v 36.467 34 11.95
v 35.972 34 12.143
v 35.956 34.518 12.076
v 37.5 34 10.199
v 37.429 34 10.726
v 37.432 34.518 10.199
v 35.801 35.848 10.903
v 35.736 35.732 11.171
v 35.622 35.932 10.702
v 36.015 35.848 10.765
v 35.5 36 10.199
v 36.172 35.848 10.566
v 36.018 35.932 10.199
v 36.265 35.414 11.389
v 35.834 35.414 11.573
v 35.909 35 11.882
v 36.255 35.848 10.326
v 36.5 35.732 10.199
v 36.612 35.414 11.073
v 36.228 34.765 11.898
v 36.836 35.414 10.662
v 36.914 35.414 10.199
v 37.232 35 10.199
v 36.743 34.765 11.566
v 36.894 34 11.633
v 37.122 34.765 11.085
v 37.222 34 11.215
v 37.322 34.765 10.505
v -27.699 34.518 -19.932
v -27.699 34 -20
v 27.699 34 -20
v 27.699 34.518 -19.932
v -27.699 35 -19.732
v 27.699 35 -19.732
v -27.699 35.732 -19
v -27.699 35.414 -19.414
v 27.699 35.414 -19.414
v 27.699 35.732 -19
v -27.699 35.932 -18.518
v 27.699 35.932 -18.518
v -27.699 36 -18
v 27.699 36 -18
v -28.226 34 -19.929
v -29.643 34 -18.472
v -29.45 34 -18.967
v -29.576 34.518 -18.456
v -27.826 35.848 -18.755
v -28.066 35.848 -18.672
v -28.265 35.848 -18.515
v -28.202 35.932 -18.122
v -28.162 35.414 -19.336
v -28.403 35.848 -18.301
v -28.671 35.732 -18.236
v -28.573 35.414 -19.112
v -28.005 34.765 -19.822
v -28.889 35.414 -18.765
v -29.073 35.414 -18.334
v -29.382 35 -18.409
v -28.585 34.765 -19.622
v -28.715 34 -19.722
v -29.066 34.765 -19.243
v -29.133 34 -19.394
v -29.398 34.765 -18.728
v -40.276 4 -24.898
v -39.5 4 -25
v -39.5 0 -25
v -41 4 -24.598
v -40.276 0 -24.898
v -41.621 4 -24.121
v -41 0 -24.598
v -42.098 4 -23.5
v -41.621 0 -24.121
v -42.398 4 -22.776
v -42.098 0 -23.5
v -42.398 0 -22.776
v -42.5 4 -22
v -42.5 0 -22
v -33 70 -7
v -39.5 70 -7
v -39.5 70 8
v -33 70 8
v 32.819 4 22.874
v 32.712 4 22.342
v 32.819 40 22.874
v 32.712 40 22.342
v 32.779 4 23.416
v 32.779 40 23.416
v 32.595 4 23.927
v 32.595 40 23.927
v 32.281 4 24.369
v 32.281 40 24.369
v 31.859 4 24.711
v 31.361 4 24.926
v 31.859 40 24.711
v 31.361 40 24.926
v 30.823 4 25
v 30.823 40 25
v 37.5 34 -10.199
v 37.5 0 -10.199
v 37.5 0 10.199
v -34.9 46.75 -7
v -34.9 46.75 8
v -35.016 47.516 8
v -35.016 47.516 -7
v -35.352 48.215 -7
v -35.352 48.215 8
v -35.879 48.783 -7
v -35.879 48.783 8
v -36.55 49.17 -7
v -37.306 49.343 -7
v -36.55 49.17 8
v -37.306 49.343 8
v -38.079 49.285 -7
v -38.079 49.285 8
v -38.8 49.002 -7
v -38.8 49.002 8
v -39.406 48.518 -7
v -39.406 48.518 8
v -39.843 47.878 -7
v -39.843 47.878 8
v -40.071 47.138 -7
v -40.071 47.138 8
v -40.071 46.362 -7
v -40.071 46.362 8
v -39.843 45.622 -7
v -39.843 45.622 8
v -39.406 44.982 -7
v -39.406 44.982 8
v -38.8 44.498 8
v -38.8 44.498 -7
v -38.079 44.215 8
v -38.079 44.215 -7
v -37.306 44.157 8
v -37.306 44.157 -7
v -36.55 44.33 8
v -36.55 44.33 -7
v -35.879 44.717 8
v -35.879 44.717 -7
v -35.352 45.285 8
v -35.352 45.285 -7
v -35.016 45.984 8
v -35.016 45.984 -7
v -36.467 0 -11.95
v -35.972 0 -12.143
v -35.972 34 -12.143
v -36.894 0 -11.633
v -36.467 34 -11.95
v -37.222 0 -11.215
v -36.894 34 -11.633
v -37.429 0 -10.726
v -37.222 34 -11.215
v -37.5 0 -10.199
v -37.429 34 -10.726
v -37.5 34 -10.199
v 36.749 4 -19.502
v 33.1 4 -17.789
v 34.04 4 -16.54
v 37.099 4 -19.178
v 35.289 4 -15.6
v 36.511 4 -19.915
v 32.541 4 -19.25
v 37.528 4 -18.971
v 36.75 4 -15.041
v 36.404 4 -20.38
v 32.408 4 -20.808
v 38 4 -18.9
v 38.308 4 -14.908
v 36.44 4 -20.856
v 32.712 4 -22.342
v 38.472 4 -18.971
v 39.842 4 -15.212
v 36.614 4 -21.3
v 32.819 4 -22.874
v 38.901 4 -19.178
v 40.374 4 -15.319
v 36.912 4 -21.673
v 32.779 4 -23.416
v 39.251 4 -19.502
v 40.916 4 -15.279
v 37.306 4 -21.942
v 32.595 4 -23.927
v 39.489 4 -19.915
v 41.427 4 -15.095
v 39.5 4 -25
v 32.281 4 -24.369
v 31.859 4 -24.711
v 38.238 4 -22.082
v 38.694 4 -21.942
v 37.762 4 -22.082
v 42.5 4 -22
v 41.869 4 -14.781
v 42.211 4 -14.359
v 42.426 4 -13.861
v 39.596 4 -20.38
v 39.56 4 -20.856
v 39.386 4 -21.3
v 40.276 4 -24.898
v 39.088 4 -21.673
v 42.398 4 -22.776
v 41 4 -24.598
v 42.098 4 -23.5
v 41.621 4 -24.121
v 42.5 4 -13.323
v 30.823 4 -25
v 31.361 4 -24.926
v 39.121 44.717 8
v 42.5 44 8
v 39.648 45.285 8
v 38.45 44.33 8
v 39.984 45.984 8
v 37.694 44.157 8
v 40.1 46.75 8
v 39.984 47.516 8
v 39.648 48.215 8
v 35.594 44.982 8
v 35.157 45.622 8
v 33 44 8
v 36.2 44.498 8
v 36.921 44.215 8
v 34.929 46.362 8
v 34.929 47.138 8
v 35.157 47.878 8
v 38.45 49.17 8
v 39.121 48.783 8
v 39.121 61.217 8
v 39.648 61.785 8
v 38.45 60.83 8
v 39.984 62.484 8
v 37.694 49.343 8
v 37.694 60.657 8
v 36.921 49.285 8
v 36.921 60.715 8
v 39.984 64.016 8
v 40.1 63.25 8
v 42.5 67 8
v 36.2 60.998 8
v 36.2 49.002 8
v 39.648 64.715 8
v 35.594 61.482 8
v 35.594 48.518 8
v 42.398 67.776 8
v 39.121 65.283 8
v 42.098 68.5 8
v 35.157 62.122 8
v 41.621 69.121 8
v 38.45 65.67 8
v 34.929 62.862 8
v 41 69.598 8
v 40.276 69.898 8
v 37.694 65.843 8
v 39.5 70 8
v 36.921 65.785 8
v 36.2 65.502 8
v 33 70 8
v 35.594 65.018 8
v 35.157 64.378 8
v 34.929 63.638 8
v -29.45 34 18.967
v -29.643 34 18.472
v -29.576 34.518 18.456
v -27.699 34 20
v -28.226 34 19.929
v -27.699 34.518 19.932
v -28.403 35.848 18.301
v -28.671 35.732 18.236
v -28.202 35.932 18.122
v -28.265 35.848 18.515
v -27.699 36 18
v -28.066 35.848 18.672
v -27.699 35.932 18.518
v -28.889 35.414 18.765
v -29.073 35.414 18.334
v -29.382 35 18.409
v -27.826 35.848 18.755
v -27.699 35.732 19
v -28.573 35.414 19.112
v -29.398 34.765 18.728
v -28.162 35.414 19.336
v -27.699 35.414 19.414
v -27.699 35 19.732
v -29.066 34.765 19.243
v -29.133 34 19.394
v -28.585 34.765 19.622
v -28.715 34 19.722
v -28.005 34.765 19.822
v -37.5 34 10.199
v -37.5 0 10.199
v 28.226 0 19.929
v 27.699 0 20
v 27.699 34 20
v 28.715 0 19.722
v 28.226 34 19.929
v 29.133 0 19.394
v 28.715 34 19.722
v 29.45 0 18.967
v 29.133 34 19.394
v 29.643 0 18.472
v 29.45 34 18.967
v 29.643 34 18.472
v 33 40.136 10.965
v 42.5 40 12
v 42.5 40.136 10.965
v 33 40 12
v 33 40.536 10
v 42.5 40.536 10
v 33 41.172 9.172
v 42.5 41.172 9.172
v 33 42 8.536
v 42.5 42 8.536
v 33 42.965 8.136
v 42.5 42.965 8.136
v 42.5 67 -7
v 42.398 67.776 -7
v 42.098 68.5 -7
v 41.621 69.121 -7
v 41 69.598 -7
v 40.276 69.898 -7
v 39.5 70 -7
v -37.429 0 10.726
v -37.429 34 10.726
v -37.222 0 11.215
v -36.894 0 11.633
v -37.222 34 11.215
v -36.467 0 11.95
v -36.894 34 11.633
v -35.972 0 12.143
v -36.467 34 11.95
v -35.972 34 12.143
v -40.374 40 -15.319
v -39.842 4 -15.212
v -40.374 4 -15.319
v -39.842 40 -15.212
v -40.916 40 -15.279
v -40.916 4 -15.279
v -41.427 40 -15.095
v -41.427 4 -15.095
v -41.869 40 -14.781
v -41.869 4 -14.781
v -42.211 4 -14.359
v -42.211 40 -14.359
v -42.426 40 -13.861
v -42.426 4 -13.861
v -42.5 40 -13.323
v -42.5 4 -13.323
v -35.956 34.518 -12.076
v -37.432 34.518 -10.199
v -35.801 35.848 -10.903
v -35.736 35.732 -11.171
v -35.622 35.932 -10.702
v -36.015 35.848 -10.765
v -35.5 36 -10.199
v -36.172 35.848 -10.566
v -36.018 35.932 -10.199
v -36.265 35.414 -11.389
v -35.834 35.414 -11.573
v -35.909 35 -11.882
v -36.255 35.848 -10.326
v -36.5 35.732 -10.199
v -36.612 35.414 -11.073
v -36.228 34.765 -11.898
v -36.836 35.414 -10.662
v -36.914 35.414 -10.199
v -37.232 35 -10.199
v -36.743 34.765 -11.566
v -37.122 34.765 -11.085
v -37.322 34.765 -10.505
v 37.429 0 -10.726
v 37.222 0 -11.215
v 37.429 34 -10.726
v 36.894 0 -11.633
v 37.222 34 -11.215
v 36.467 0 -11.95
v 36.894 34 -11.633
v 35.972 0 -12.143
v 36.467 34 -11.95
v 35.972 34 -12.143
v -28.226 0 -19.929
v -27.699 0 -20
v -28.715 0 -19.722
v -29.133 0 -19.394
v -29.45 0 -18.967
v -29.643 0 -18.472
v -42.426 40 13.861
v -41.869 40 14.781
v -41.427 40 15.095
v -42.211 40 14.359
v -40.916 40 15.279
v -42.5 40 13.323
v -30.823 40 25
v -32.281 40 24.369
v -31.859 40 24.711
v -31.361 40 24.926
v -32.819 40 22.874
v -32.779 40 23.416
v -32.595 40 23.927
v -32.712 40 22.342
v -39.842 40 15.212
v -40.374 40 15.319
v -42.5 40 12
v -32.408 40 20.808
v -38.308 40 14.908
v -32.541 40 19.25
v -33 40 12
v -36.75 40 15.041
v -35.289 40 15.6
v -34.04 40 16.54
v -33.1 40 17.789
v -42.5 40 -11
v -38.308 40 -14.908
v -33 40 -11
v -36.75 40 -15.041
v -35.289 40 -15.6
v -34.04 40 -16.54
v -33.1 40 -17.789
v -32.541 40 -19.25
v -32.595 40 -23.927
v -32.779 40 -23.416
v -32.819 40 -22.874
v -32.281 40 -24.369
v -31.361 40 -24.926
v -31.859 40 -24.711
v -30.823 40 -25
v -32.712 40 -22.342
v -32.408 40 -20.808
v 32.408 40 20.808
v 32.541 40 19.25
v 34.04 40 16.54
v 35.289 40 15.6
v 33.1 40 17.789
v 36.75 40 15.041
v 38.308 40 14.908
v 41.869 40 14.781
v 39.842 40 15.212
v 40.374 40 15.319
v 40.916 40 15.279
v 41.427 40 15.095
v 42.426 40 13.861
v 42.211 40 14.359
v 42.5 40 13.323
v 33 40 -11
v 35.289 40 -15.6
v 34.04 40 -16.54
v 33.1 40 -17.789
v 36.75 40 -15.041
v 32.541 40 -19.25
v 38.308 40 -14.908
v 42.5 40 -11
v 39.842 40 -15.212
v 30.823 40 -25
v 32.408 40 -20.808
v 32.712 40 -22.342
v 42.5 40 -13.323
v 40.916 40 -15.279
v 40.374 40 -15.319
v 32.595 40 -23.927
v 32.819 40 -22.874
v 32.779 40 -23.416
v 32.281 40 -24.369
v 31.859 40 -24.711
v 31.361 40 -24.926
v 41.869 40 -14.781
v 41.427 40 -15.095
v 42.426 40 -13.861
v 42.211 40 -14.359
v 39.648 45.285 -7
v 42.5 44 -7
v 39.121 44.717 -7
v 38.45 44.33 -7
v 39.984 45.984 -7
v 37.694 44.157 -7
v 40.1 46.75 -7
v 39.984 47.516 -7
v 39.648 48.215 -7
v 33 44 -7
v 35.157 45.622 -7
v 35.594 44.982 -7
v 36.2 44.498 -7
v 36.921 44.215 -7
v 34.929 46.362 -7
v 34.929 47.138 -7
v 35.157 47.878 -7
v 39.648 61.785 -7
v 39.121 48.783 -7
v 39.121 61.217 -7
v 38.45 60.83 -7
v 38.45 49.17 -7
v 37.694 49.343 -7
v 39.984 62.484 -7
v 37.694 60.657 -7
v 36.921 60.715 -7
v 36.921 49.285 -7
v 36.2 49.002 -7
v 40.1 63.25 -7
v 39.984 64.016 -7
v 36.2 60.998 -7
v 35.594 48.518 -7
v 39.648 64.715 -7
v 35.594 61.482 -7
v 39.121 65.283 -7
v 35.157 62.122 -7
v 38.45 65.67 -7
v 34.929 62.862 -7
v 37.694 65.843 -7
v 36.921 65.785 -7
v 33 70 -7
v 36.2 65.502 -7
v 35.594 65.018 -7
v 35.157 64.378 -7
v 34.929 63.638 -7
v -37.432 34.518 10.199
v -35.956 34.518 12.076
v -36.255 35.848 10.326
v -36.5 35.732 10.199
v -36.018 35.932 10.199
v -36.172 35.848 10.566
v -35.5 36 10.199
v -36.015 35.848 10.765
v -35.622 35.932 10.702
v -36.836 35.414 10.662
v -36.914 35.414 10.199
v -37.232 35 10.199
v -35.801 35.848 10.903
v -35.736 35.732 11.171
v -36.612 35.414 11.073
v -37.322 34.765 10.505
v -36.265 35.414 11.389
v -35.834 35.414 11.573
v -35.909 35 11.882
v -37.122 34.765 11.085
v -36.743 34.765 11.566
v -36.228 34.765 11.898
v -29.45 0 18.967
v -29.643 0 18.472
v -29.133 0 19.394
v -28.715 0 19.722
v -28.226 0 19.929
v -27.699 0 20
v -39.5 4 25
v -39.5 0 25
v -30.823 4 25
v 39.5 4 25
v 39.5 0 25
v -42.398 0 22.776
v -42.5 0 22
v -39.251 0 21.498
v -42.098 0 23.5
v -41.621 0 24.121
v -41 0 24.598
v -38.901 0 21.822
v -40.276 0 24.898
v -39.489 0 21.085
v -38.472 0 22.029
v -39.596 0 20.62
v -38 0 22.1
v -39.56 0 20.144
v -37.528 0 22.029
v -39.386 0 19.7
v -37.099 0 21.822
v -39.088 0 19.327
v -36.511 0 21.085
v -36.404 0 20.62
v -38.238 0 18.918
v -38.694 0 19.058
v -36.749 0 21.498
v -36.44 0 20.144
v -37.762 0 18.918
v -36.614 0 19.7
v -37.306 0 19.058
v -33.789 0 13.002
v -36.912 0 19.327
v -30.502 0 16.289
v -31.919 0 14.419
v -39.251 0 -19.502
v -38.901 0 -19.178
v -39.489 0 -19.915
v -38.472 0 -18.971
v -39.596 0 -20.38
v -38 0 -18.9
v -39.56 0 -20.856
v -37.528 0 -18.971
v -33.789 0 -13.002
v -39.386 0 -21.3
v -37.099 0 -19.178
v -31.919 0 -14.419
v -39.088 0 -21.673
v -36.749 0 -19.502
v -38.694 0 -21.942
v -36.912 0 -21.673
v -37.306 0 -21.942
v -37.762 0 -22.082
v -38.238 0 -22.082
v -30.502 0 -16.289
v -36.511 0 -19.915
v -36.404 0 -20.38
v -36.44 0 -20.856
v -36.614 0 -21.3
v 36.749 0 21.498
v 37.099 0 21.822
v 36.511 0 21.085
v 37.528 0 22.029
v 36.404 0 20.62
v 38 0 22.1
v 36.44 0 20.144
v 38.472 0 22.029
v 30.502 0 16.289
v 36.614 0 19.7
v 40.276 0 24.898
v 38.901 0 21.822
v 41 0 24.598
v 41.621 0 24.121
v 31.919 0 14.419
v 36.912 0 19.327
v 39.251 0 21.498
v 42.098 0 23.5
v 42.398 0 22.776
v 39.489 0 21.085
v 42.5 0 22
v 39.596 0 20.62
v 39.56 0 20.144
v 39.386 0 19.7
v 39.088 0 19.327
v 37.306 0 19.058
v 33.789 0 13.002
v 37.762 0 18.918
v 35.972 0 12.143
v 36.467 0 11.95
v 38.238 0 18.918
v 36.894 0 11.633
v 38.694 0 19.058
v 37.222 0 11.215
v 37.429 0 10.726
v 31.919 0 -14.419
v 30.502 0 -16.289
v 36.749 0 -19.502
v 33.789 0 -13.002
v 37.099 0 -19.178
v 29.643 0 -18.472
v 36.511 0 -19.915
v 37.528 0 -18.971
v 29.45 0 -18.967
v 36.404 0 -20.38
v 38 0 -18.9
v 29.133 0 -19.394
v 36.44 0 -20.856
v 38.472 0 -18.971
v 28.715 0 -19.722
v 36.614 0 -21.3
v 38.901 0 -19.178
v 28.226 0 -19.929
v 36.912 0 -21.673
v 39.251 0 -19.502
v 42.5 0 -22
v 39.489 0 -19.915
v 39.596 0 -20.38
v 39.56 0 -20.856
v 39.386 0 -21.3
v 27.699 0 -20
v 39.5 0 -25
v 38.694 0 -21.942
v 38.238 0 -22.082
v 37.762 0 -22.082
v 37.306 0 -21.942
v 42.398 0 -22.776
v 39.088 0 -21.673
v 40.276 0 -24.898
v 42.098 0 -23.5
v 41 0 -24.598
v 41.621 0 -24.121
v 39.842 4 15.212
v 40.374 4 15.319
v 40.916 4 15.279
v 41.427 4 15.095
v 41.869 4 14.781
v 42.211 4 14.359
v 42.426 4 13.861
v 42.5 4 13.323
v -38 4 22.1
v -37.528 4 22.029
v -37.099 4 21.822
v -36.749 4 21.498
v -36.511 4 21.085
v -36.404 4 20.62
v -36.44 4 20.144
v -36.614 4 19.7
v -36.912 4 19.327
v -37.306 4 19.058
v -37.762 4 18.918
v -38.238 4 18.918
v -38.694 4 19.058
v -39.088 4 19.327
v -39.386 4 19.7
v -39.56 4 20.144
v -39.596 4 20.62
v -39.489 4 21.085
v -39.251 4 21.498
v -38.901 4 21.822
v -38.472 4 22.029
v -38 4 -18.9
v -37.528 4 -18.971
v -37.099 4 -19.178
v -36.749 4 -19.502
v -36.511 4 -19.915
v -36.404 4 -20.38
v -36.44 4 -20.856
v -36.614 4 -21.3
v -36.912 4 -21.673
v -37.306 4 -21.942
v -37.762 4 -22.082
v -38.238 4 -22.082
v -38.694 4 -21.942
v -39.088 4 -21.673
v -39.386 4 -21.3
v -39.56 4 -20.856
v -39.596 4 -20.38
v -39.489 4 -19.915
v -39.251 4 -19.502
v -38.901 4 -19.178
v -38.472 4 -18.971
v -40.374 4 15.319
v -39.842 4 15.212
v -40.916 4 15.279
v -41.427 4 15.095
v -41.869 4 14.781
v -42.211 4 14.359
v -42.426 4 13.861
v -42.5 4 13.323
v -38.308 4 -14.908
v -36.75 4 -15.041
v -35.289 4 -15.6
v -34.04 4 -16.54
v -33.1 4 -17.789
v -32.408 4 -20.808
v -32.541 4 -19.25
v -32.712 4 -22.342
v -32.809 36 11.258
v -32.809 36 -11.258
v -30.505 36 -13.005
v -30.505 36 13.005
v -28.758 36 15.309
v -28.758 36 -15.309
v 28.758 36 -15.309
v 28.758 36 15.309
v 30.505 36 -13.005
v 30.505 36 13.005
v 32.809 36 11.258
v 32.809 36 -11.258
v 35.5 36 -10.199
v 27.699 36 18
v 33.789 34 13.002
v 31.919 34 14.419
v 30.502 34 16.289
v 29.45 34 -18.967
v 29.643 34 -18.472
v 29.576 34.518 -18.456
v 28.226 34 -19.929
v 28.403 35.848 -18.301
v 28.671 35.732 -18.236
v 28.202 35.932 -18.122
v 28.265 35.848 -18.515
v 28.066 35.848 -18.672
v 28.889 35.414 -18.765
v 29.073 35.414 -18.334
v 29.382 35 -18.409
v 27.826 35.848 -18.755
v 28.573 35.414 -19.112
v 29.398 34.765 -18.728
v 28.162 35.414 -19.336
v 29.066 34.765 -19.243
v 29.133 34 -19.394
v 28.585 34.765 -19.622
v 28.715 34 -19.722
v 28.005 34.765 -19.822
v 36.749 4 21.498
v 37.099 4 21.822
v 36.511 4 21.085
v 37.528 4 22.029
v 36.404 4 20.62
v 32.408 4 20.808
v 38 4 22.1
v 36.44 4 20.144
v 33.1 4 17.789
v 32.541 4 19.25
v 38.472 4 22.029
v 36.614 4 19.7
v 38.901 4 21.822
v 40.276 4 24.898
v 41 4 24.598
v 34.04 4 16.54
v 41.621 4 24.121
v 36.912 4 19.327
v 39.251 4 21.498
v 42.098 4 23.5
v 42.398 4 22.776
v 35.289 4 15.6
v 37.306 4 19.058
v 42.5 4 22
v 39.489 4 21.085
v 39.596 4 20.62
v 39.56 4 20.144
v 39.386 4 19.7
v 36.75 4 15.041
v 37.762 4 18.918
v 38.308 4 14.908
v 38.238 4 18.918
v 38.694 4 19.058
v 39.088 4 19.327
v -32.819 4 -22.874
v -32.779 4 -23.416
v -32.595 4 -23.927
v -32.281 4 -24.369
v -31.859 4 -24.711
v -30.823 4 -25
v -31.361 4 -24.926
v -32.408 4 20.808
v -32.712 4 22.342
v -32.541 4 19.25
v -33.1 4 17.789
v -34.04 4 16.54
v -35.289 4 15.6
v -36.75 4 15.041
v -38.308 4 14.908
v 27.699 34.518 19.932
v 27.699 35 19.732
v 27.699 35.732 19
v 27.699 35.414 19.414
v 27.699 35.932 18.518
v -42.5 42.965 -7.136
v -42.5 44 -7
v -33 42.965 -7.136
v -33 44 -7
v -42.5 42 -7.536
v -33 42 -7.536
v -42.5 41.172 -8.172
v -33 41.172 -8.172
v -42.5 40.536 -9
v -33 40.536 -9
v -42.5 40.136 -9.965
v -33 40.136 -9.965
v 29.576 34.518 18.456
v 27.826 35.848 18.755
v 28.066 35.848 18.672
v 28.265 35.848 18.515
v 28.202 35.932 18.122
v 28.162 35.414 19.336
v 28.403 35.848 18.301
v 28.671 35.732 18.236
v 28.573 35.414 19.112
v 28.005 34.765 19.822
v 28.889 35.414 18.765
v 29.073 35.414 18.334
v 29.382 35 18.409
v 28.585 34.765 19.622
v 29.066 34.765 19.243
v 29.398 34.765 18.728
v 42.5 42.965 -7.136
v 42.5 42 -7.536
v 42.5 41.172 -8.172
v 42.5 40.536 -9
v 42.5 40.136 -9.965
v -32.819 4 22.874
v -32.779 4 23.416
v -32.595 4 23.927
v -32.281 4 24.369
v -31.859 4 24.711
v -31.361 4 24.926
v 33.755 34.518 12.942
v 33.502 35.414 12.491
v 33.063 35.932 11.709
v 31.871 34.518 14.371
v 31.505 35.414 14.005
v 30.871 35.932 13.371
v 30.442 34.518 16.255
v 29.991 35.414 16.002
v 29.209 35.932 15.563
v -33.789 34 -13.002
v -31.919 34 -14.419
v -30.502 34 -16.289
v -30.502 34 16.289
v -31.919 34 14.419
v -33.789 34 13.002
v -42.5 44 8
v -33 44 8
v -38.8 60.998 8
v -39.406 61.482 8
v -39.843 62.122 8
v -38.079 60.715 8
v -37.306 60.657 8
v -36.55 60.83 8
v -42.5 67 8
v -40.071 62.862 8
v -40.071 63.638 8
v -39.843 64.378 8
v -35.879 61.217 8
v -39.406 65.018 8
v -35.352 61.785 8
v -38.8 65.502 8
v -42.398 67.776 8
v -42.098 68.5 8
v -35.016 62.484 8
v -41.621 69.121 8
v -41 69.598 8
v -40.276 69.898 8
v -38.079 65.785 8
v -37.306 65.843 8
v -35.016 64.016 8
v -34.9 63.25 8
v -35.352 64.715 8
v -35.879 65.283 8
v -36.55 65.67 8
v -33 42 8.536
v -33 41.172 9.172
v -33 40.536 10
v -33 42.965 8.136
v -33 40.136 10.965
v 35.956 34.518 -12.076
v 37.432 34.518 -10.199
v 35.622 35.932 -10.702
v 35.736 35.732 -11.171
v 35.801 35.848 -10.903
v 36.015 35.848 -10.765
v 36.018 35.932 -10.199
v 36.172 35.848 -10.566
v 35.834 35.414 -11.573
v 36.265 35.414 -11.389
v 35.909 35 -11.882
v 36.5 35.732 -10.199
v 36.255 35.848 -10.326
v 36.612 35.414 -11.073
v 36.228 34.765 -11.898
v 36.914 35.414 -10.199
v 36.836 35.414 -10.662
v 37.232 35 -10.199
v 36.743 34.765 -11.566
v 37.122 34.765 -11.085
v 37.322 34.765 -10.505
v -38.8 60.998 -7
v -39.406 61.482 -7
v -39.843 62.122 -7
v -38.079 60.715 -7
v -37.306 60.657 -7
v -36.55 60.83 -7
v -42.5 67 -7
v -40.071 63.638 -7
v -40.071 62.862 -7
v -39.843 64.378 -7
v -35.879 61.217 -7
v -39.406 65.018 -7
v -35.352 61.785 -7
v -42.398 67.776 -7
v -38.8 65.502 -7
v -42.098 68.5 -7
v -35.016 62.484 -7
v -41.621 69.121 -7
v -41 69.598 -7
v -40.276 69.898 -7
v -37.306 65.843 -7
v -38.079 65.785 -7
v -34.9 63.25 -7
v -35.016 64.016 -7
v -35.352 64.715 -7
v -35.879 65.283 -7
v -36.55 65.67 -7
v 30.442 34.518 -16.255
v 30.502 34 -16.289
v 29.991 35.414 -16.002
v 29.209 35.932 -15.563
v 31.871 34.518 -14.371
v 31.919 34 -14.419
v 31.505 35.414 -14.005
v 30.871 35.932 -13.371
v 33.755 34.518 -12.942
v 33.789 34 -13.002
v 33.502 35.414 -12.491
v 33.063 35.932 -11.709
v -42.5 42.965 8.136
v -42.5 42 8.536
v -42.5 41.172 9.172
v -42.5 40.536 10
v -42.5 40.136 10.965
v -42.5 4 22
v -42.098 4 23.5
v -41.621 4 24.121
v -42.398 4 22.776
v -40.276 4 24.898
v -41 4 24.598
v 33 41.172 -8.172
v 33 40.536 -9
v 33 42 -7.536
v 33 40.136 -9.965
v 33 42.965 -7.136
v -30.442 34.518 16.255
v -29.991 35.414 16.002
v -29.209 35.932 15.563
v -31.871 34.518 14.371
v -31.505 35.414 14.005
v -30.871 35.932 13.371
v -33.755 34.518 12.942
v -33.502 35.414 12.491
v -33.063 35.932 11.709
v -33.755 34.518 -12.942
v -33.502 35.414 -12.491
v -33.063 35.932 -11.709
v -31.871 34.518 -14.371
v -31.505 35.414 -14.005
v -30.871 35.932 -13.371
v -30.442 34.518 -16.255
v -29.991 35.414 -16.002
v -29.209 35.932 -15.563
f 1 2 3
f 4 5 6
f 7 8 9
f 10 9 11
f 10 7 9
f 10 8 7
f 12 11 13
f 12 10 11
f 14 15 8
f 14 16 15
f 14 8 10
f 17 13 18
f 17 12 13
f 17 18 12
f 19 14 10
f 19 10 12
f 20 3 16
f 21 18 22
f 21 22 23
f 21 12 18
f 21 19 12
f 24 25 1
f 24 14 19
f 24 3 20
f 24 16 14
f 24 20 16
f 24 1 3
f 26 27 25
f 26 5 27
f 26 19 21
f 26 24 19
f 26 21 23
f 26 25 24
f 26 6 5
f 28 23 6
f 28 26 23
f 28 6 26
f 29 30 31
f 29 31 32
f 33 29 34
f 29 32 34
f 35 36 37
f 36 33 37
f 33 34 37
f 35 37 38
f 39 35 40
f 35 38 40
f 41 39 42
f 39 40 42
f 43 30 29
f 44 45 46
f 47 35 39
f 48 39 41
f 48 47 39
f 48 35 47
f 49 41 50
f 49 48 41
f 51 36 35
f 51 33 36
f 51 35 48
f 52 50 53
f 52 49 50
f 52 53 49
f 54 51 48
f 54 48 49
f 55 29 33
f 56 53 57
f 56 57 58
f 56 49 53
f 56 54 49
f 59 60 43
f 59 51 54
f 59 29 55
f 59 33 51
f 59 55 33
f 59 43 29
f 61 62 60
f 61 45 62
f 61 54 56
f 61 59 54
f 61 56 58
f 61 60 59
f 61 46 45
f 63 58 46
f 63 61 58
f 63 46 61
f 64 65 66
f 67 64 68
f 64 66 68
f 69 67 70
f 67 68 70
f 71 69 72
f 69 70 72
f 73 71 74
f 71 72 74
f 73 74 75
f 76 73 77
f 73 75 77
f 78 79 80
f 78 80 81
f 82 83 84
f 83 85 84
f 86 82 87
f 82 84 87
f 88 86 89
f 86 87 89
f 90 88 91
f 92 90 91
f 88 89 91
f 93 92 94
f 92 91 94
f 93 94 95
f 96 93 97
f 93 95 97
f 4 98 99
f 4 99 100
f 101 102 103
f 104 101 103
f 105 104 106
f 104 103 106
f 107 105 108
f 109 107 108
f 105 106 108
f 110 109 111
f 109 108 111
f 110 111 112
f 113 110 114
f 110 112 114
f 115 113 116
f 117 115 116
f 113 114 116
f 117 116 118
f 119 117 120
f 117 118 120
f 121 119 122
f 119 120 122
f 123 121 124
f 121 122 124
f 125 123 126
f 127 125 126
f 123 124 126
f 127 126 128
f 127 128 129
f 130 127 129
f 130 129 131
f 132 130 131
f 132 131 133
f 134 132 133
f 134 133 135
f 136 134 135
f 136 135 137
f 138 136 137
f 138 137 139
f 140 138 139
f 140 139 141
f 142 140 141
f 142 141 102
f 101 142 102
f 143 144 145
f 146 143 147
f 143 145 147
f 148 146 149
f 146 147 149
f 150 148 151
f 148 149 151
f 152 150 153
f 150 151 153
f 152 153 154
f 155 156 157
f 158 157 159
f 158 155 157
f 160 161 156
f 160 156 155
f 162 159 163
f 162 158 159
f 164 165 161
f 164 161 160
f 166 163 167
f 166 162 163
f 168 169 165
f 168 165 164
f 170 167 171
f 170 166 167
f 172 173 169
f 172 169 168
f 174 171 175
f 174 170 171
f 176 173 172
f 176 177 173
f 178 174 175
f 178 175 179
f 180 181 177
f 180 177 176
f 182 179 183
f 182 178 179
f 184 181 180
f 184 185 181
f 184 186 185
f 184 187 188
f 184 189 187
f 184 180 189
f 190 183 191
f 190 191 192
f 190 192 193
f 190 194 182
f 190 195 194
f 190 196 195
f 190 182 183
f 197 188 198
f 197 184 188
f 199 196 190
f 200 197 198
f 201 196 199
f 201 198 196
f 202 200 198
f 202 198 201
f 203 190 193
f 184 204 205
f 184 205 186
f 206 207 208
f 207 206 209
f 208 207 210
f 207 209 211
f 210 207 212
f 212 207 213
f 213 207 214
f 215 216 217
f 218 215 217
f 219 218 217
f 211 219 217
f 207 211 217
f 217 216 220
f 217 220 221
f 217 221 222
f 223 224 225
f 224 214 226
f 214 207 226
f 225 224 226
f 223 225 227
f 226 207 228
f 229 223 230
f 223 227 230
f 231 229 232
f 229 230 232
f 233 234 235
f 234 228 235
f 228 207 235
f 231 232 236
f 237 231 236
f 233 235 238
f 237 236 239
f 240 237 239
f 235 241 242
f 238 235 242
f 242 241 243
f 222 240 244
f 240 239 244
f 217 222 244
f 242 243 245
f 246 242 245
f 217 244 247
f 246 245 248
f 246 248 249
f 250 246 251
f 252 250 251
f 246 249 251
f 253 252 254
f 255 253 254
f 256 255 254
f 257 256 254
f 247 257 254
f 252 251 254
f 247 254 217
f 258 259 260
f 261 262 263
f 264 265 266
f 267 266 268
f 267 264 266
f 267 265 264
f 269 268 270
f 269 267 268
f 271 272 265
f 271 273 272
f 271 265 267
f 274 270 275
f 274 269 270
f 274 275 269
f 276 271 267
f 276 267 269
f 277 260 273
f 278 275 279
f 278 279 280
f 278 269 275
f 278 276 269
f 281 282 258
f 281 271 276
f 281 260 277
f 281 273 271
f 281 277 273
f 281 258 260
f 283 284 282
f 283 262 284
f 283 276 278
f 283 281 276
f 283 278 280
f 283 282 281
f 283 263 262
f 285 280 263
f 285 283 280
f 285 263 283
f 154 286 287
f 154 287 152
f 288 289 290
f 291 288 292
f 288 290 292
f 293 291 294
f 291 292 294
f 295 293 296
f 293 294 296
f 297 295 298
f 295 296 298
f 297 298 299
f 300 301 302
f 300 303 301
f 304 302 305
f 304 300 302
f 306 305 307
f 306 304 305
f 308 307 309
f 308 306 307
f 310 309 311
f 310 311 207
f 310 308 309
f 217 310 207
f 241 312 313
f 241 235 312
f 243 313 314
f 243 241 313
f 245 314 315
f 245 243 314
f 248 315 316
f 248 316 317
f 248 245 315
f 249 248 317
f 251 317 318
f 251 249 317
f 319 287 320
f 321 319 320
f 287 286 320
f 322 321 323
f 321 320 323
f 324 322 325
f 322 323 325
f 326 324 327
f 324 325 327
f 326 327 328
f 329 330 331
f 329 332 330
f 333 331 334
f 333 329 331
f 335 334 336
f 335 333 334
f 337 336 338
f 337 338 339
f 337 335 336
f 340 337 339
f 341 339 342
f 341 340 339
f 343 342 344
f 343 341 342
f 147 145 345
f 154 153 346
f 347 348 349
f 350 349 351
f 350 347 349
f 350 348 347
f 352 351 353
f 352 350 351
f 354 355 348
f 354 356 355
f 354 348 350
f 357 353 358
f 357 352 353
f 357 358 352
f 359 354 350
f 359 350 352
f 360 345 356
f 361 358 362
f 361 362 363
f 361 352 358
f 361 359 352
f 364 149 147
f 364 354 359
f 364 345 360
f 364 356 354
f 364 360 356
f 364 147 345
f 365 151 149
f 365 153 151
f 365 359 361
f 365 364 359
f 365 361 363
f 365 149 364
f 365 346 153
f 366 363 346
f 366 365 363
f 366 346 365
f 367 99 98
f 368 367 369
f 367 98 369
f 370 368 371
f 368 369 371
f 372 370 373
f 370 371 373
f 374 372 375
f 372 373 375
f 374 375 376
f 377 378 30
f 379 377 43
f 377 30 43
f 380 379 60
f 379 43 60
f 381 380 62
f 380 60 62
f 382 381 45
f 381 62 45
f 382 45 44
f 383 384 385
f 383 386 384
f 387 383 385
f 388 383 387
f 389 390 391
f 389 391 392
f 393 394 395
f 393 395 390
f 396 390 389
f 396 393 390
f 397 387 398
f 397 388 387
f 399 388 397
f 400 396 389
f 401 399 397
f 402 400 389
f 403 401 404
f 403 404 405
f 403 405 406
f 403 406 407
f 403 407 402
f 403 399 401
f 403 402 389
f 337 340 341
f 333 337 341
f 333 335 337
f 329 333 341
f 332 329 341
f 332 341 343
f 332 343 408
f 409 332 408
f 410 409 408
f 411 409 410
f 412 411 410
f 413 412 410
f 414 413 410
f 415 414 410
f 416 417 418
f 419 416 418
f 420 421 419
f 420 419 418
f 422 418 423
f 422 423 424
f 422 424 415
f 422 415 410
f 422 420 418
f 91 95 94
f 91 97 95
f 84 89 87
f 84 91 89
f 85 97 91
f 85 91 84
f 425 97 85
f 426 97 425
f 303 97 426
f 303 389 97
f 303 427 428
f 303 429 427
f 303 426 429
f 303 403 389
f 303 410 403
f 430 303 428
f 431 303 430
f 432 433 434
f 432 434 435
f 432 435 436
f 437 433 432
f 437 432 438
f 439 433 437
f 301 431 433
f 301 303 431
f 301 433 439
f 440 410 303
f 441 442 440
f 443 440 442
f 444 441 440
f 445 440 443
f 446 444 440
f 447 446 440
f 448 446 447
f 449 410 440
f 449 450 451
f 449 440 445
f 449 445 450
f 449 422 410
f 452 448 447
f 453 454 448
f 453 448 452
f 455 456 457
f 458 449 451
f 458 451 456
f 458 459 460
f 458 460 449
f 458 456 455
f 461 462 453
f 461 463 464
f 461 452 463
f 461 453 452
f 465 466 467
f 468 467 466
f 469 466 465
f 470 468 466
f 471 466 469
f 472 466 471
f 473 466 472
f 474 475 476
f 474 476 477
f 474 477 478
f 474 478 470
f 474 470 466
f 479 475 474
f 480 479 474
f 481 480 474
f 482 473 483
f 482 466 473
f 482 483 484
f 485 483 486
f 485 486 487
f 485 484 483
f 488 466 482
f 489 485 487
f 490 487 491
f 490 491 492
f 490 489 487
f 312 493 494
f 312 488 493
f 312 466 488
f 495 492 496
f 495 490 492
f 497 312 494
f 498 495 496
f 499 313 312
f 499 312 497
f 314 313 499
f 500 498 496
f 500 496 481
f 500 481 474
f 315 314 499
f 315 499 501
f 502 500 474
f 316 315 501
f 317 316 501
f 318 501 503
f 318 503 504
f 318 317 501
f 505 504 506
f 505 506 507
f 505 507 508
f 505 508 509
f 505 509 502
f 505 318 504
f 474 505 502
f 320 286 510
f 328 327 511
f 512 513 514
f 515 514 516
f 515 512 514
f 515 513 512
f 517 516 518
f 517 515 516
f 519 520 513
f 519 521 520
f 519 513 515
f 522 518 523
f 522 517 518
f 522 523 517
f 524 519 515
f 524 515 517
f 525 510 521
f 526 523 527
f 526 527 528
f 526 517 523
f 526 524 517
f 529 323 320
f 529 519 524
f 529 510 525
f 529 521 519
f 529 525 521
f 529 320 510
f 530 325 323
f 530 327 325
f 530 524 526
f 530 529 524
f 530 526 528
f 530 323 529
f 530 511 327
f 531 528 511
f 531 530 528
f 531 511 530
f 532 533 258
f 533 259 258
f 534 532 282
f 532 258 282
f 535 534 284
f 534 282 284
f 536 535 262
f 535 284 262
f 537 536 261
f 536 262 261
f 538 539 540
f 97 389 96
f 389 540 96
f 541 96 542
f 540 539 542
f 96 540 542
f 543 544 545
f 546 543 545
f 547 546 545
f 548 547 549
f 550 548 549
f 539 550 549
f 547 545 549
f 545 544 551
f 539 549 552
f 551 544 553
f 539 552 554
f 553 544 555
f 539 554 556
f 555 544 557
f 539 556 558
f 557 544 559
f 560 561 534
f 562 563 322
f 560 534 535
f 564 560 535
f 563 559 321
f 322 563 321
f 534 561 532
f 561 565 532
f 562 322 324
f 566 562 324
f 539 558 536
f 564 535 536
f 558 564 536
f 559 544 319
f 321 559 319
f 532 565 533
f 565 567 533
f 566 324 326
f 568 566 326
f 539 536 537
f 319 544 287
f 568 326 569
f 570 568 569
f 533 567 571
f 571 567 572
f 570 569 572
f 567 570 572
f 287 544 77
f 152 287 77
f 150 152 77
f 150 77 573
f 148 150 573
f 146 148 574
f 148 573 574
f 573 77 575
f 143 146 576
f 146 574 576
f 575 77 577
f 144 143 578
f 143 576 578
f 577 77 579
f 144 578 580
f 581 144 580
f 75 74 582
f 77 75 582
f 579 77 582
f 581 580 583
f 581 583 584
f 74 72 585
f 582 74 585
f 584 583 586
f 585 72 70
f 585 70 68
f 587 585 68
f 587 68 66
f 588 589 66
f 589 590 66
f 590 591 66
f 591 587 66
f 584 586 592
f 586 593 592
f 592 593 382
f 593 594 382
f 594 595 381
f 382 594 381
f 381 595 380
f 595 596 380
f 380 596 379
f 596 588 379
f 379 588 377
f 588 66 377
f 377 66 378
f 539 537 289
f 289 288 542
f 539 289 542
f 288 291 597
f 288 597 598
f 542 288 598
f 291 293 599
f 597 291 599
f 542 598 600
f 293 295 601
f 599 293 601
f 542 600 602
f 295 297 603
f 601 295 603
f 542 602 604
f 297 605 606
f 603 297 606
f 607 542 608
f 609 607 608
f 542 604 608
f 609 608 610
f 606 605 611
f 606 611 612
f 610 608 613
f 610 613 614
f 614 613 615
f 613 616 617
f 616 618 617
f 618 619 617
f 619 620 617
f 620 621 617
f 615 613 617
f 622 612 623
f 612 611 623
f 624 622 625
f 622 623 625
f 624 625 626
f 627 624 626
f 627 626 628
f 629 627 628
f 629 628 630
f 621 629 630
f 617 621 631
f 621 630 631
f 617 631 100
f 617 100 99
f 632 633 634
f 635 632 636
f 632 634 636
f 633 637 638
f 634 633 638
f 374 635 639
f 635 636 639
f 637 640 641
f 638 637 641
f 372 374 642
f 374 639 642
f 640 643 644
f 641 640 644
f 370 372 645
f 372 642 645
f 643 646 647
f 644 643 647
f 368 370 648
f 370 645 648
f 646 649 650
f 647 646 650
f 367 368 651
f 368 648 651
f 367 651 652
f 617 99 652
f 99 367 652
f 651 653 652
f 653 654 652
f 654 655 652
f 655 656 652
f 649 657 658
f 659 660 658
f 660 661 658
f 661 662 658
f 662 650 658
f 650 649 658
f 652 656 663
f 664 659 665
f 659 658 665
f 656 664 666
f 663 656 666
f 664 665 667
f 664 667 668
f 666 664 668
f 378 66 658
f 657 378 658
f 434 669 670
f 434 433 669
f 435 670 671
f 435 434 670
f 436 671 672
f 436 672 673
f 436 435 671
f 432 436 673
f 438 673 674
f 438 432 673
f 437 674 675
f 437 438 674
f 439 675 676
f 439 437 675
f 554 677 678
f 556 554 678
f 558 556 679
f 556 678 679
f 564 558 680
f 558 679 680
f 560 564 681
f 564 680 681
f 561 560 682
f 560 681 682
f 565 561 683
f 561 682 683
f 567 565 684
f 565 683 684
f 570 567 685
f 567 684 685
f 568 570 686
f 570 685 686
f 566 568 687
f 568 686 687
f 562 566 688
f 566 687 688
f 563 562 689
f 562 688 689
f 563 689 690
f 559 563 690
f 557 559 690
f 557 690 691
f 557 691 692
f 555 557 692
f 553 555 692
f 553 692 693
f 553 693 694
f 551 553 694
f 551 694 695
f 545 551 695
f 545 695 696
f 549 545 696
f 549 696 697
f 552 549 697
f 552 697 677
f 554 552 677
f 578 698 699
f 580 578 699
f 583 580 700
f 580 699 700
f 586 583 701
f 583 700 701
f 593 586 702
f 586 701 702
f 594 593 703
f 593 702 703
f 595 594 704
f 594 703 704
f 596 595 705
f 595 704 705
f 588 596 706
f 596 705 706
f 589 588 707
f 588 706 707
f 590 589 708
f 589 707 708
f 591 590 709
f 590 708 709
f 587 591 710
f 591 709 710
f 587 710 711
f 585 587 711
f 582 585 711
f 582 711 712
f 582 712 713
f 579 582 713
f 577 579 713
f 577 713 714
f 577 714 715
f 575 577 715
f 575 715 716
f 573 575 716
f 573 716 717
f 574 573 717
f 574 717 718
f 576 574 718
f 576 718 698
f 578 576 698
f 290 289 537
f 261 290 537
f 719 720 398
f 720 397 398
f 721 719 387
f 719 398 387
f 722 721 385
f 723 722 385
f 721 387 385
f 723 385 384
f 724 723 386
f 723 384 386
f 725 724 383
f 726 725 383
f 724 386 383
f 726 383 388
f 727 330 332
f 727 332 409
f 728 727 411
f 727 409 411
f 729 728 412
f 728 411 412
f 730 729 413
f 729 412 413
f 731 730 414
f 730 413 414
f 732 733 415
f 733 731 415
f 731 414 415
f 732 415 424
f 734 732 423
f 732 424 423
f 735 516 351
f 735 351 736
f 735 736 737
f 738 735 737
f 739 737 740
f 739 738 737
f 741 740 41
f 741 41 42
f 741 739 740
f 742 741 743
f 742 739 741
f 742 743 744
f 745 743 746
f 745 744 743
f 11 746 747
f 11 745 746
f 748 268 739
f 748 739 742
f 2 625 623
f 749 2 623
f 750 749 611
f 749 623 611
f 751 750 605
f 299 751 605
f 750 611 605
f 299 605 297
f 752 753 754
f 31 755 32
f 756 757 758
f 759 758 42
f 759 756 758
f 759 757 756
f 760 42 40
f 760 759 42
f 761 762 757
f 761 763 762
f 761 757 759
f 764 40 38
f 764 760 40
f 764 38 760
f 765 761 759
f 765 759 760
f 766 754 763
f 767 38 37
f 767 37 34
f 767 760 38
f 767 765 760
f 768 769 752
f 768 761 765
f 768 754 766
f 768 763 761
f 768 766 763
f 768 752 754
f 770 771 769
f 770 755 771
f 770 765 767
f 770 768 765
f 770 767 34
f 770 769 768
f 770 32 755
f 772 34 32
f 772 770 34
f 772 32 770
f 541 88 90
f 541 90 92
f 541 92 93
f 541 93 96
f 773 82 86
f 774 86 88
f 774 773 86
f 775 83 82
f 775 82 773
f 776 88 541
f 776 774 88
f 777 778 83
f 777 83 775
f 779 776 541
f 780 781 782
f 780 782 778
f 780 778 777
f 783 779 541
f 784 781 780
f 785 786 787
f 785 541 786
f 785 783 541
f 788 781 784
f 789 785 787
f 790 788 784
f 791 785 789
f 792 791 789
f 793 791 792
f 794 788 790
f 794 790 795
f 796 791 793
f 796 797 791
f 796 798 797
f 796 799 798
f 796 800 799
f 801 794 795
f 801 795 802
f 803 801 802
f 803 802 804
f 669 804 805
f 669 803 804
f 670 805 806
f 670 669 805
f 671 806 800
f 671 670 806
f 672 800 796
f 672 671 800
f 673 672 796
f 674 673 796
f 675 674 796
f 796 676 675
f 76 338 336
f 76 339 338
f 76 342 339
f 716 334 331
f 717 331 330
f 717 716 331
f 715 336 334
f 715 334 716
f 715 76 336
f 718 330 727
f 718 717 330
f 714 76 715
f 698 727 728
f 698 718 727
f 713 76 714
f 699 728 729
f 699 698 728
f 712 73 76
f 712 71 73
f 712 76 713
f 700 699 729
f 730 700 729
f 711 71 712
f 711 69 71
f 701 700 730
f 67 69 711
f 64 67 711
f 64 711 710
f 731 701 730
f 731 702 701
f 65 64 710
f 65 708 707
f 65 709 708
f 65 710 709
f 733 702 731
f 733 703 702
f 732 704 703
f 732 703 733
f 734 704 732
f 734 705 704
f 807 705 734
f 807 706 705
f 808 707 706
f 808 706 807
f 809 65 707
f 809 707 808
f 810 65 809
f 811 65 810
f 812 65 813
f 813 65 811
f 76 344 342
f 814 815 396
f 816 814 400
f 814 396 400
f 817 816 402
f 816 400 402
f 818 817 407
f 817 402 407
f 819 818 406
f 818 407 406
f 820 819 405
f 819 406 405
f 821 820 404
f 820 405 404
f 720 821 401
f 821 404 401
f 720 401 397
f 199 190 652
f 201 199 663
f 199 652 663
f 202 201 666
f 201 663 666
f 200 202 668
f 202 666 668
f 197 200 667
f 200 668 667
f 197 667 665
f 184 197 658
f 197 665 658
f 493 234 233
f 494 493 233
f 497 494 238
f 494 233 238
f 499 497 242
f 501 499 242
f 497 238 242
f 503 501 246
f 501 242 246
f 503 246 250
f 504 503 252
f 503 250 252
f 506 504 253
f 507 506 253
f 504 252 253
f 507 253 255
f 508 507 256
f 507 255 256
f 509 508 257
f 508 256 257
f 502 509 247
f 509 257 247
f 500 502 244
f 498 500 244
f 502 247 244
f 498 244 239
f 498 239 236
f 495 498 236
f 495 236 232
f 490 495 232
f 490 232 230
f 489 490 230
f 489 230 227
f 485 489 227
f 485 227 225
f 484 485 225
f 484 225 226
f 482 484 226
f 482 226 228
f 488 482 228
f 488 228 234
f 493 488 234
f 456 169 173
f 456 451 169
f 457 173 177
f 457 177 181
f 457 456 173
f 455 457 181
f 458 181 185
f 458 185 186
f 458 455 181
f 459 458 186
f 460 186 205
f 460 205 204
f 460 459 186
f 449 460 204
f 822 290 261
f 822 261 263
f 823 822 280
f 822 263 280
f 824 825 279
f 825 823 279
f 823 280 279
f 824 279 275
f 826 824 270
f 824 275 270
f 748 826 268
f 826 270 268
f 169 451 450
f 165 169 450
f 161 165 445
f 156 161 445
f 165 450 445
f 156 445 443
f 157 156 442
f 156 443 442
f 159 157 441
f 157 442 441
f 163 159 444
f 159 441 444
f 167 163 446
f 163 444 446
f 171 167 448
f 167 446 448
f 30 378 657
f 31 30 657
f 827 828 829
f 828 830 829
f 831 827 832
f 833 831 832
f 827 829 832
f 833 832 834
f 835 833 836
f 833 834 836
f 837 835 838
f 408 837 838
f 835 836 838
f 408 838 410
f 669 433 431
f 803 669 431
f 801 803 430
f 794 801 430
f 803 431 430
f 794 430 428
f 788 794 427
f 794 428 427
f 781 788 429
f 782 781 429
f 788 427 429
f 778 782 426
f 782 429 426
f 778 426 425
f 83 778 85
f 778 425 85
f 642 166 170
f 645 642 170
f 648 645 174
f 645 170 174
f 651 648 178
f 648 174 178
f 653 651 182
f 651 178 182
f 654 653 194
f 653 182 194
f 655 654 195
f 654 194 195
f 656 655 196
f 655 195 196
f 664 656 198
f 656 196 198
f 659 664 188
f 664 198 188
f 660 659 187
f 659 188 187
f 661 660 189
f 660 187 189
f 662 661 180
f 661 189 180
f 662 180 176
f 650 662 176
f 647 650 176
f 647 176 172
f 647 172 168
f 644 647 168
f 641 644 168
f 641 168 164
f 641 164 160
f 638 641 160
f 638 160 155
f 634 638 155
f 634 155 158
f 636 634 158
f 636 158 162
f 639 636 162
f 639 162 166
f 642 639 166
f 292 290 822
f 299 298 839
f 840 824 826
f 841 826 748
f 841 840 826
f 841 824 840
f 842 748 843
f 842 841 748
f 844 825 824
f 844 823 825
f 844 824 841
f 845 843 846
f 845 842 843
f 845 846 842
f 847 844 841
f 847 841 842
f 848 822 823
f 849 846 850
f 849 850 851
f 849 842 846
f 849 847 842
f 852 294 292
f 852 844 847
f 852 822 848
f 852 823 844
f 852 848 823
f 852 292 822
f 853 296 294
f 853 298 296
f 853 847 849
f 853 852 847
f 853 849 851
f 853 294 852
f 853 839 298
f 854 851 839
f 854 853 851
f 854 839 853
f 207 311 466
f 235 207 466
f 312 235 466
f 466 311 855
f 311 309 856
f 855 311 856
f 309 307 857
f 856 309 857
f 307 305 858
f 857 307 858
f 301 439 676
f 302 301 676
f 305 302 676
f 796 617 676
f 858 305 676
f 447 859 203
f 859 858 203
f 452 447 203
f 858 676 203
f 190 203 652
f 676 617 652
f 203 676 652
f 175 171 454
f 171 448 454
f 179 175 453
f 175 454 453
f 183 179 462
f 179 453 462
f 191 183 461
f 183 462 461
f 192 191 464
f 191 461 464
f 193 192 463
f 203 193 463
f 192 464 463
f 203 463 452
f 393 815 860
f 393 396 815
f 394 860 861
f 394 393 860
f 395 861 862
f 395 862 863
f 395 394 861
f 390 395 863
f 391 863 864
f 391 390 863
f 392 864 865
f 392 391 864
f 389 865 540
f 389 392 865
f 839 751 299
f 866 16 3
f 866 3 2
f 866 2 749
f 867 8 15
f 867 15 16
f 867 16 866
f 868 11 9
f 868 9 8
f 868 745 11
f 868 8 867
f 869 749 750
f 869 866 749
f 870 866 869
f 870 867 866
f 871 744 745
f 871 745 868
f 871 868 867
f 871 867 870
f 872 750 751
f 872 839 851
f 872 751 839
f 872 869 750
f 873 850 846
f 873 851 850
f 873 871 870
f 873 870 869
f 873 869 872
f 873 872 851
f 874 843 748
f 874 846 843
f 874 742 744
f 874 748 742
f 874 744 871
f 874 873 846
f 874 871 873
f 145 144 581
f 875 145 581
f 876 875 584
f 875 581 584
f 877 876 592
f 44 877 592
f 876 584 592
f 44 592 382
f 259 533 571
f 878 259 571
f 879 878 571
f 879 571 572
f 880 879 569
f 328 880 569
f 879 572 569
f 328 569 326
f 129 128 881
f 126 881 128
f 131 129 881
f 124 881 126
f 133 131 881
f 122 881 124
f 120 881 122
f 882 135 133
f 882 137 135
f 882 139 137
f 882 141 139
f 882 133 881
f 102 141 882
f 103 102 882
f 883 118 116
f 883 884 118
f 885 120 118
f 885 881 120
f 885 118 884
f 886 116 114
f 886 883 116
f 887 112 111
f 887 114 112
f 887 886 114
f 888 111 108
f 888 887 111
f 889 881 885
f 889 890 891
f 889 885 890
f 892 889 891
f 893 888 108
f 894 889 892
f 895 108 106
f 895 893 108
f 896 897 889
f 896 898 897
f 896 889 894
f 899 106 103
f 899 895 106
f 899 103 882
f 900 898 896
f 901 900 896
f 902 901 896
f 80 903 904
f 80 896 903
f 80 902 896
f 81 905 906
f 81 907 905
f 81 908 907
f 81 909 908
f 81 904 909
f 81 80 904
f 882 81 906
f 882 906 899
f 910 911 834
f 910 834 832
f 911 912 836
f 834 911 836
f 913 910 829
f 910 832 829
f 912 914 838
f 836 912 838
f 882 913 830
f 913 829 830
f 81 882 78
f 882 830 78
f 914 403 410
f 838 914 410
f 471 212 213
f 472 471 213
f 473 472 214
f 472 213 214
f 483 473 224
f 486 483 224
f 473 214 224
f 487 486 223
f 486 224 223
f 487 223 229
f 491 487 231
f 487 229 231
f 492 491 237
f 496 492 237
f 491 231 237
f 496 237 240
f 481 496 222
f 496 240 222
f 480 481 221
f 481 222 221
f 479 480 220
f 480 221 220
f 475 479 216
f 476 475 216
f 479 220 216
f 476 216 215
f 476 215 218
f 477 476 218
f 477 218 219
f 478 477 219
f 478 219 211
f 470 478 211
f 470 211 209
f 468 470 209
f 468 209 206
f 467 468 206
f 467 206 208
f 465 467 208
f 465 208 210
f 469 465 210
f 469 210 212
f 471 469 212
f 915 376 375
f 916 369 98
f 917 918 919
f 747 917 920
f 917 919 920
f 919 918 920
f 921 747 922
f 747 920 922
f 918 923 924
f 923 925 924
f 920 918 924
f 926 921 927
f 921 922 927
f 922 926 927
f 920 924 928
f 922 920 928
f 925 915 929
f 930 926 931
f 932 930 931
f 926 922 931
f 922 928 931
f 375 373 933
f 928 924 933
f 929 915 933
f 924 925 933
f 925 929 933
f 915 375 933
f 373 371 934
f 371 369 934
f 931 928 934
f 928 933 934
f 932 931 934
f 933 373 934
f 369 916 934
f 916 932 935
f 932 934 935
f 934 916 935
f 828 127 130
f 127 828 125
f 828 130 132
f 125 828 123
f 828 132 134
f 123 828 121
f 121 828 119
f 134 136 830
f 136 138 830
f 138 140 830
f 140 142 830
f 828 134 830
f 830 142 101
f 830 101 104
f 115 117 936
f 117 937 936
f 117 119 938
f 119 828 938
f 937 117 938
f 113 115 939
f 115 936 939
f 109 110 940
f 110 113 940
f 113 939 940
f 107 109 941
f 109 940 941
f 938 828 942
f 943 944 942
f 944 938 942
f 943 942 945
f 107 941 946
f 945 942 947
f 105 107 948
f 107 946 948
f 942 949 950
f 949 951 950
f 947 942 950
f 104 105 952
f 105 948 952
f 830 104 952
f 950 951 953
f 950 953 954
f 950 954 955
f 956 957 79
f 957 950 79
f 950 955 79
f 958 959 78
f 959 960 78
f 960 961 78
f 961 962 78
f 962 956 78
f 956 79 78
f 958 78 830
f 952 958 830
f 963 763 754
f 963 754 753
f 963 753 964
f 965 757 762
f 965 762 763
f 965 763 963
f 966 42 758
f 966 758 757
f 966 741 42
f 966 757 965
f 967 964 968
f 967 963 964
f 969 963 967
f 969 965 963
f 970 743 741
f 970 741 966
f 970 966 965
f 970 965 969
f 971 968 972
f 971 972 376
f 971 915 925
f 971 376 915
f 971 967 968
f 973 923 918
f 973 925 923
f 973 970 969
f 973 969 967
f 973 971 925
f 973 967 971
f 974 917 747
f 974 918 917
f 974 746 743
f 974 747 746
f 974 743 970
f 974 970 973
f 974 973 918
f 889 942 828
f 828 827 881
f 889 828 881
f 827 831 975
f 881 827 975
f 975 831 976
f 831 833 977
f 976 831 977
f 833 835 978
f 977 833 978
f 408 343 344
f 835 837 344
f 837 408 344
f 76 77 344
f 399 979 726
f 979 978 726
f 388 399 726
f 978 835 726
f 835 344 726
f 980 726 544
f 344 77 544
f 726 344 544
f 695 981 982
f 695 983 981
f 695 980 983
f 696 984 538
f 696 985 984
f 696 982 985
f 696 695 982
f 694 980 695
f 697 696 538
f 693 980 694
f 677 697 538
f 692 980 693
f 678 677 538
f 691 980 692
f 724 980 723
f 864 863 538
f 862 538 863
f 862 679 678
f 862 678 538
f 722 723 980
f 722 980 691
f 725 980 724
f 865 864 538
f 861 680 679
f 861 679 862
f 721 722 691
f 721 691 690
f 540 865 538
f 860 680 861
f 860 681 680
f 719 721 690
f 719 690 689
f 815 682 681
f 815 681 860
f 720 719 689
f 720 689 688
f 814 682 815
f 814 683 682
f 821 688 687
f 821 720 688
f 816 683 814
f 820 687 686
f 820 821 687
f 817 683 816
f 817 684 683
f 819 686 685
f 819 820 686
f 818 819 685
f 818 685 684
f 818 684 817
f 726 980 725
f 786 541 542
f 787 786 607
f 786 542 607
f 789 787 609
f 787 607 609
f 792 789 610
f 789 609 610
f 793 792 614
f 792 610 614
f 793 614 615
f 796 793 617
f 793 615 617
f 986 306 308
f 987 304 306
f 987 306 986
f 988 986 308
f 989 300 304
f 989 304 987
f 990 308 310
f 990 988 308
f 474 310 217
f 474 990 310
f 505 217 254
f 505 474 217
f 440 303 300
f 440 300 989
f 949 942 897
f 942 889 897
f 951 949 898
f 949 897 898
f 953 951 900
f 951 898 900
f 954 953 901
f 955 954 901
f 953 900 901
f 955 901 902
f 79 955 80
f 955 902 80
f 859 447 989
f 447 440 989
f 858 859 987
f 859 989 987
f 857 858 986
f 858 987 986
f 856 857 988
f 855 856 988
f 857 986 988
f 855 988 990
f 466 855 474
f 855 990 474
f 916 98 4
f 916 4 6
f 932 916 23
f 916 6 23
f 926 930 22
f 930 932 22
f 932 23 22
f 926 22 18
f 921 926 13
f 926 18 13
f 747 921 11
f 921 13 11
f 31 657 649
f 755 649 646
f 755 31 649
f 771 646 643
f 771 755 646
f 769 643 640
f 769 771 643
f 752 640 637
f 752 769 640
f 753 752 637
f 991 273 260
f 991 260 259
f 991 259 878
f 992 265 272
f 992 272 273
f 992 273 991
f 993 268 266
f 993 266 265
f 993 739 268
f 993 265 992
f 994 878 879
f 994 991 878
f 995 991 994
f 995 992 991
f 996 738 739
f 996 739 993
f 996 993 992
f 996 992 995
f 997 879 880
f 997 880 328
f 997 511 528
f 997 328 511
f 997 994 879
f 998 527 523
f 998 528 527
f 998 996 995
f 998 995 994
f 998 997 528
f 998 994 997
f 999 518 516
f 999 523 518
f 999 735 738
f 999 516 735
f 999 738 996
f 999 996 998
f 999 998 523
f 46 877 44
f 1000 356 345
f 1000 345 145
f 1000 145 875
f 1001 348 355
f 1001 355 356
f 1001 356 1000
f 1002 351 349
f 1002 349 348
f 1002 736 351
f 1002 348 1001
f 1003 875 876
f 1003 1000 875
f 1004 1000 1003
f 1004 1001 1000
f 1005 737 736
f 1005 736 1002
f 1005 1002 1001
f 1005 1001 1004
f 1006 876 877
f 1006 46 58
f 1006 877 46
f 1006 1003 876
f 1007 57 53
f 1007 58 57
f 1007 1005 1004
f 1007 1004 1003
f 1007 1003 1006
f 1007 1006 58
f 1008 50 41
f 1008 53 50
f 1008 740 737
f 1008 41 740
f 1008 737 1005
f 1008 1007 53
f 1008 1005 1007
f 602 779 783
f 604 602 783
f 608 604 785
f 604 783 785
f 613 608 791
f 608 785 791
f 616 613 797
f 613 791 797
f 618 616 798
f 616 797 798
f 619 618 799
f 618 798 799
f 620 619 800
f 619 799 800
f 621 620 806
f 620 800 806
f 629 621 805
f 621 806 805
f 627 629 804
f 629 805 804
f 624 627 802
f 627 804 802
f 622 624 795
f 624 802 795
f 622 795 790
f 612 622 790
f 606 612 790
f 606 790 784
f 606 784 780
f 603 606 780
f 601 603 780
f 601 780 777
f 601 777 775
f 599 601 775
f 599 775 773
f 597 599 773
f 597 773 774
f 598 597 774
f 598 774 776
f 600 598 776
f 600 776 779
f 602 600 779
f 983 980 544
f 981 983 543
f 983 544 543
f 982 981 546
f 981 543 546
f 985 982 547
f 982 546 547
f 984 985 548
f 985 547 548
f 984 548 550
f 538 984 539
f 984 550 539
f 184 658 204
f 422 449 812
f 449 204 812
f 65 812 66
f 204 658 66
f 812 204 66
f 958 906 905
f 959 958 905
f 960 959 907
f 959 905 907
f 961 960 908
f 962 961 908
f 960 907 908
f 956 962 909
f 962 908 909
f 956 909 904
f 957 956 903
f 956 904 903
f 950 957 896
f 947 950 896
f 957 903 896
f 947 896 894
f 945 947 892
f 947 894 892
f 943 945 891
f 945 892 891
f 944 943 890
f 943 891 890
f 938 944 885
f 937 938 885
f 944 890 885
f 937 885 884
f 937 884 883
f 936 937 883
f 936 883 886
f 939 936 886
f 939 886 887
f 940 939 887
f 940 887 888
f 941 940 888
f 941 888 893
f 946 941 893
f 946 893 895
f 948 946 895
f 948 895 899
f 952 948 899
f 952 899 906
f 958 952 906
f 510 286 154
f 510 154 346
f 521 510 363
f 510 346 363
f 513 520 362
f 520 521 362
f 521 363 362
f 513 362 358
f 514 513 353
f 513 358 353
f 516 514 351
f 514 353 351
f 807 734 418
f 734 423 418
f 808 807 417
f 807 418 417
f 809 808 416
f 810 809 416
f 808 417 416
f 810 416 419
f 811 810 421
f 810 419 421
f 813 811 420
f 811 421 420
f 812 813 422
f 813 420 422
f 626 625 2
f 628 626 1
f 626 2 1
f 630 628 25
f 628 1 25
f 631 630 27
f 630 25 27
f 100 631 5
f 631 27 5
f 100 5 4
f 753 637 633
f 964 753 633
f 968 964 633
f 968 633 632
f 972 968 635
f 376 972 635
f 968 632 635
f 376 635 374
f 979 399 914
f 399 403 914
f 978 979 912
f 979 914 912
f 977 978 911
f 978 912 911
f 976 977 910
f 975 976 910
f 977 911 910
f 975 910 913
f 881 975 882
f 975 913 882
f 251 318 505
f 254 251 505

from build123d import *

# Parameters (mm, degrees)
EXTRUDE_1_DEPTH     = 40
SKETCH_2_W          = 9.5
SKETCH_2_H          = 30
EXTRUDE_2_DEPTH     = 15
SKETCH_3_R          = 2.6
CUT_EXTRUDE_1_DEPTH = 89.290712988
FILLET_1_R          = 3
FILLET_2_R          = 4
SKETCH_4_R          = 1.6
CUT_EXTRUDE_2_DEPTH = 64.492125496
CUT_EXTRUDE_3_DEPTH = 36
FILLET_3_R          = 2
SKETCH_7_R          = 5.6
CUT_EXTRUDE_4_DEPTH = 36
FILLET_4_R          = 2


with BuildPart() as part:
    # 草图1 → 凸台-拉伸1 (new body)
    with BuildSketch(Plane(origin=(0, 0, 0), x_dir=(1, 0, 0), z_dir=(0, 1, 0))):
        with BuildLine():
            Line((-39.5, -25), (39.5, -25))
            ThreePointArc((39.5, -25), (41.621320344, -24.121320344), (42.5, -22))
            Line((42.5, -22), (42.5, 22))
            ThreePointArc((42.5, 22), (41.621320344, 24.121320344), (39.5, 25))
            Line((39.5, 25), (-39.5, 25))
            ThreePointArc((-39.5, 25), (-41.621320344, 24.121320344), (-42.5, 22))
            Line((-42.5, 22), (-42.5, -22))
            ThreePointArc((-42.5, -22), (-41.621320344, -24.121320344), (-39.5, -25))
        make_face()
    extrude(amount=EXTRUDE_1_DEPTH)

    # 草图2 → 凸台-拉伸2 (add)
    with BuildSketch(Plane.XY.offset(-7)):
        with Locations((-37.75, 55)):
            Rectangle(SKETCH_2_W, SKETCH_2_H)
    extrude_2 = extrude(amount=EXTRUDE_2_DEPTH)

    # 镜向1: 凸台-拉伸2 across plane
    add(extrude_2.mirror(Plane(origin=(0, 0, 0), x_dir=(0, 0, 1), z_dir=(1, 0, 0))))

    # 草图3 → 切除-拉伸1 (cut, through all)
    with BuildSketch(Plane.XY.offset(8)):
        with Locations((37.5, 63.25)):
            Circle(SKETCH_3_R)
        with Locations((37.5, 46.75)):
            Circle(SKETCH_3_R)
        with Locations((-37.5, 63.25)):
            Circle(SKETCH_3_R)
        with Locations((-37.5, 46.75)):
            Circle(SKETCH_3_R)
    extrude(amount=-CUT_EXTRUDE_1_DEPTH, mode=Mode.SUBTRACT)

    # 圆角1
    fillet_1_edges = [part.edges().sort_by_distance(p)[0] for p in [
        (-42.5, 70, 0.5),
        (42.5, 70, 0.5),
    ]]
    fillet(fillet_1_edges, radius=FILLET_1_R)

    # 圆角2
    fillet_2_edges = [part.edges().sort_by_distance(p)[0] for p in [
        (-37.75, 40, -7),
        (-37.75, 40, 8),
        (37.75, 40, 8),
        (37.75, 40, -7),
    ]]
    fillet(fillet_2_edges, radius=FILLET_2_R)

    # 草图4 → 切除-拉伸2 (cut, through all)
    with BuildSketch(Plane(origin=(0, 40, 0), x_dir=(1, 0, 0), z_dir=(0, 1, 0))):
        with Locations(Location((-38, 20.5, 0), (0, 0, 270))):
            Circle(SKETCH_4_R)
        with Locations(Location((38, 20.5, 0), (0, 0, 270))):
            Circle(SKETCH_4_R)
        with Locations(Location((38, -20.5, 0), (0, 0, 270))):
            Circle(SKETCH_4_R)
        with Locations(Location((-38, -20.5, 0), (0, 0, 270))):
            Circle(SKETCH_4_R)
    extrude(amount=-CUT_EXTRUDE_2_DEPTH, mode=Mode.SUBTRACT)

    # 草图5 → 切除-拉伸3 (cut)
    with BuildSketch(Plane.XZ):
        with BuildLine():
            ThreePointArc((29.414547187, -20), (31.918881682, -14.418881682), (37.5, -11.914547187))
            Line((37.5, -11.914547187), (37.5, 11.914547187))
            ThreePointArc((37.5, 11.914547187), (31.918881682, 14.418881682), (29.414547187, 20))
            Line((29.414547187, 20), (-29.414547187, 20))
            ThreePointArc((-29.414547187, 20), (-31.918881682, 14.418881682), (-37.5, 11.914547187))
            Line((-37.5, 11.914547187), (-37.5, -11.914547187))
            ThreePointArc((-37.5, -11.914547187), (-31.918881682, -14.418881682), (-29.414547187, -20))
            Line((-29.414547187, -20), (29.414547187, -20))
        make_face()
    extrude(amount=-CUT_EXTRUDE_3_DEPTH, mode=Mode.SUBTRACT)

    # 圆角3
    fillet_3_edges = [part.edges().sort_by_distance(p)[0] for p in [
        (31.918881682, 36, -14.418881682),
        (-31.918881682, 36, -14.418881682),
        (-31.918881682, 36, 14.418881682),
        (31.918881682, 36, 14.418881682),
        (37.5, 36, 0),
        (37.5, 18, 11.914547187),
        (29.414547187, 18, 20),
        (0, 36, 20),
        (-29.414547187, 18, 20),
        (-37.5, 18, 11.914547187),
        (-37.5, 36, 0),
        (-37.5, 18, -11.914547187),
        (-29.414547187, 18, -20),
        (0, 36, -20),
        (29.414547187, 18, -20),
        (37.5, 18, -11.914547187),
    ]]
    fillet(fillet_3_edges, radius=FILLET_3_R)

    # 草图7 → 切除-拉伸4 (cut)
    with BuildSketch(Plane(origin=(0, 40, 0), x_dir=(1, 0, 0), z_dir=(0, 1, 0))):
        with Locations((-38, 20.5)):
            Circle(SKETCH_7_R)
        with Locations((38, 20.5)):
            Circle(SKETCH_7_R)
        with Locations((-38, -20.5)):
            Circle(SKETCH_7_R)
        with Locations((38, -20.5)):
            Circle(SKETCH_7_R)
    extrude(amount=-CUT_EXTRUDE_4_DEPTH, mode=Mode.SUBTRACT)

    # 圆角4
    fillet_4_edges = [part.edges().sort_by_distance(p)[0] for p in [
        (-34.666833338, 22, 25),
        (34.666833338, 22, 25),
        (-42.5, 22, -17.166833338),
        (34.666833338, 22, -25),
        (-34.666833338, 22, -25),
        (42.5, 22, -17.166833338),
        (42.5, 22, 17.166833338),
        (-42.5, 22, 17.166833338),
    ]]
    fillet(fillet_4_edges, radius=FILLET_4_R)


solid = part.part
